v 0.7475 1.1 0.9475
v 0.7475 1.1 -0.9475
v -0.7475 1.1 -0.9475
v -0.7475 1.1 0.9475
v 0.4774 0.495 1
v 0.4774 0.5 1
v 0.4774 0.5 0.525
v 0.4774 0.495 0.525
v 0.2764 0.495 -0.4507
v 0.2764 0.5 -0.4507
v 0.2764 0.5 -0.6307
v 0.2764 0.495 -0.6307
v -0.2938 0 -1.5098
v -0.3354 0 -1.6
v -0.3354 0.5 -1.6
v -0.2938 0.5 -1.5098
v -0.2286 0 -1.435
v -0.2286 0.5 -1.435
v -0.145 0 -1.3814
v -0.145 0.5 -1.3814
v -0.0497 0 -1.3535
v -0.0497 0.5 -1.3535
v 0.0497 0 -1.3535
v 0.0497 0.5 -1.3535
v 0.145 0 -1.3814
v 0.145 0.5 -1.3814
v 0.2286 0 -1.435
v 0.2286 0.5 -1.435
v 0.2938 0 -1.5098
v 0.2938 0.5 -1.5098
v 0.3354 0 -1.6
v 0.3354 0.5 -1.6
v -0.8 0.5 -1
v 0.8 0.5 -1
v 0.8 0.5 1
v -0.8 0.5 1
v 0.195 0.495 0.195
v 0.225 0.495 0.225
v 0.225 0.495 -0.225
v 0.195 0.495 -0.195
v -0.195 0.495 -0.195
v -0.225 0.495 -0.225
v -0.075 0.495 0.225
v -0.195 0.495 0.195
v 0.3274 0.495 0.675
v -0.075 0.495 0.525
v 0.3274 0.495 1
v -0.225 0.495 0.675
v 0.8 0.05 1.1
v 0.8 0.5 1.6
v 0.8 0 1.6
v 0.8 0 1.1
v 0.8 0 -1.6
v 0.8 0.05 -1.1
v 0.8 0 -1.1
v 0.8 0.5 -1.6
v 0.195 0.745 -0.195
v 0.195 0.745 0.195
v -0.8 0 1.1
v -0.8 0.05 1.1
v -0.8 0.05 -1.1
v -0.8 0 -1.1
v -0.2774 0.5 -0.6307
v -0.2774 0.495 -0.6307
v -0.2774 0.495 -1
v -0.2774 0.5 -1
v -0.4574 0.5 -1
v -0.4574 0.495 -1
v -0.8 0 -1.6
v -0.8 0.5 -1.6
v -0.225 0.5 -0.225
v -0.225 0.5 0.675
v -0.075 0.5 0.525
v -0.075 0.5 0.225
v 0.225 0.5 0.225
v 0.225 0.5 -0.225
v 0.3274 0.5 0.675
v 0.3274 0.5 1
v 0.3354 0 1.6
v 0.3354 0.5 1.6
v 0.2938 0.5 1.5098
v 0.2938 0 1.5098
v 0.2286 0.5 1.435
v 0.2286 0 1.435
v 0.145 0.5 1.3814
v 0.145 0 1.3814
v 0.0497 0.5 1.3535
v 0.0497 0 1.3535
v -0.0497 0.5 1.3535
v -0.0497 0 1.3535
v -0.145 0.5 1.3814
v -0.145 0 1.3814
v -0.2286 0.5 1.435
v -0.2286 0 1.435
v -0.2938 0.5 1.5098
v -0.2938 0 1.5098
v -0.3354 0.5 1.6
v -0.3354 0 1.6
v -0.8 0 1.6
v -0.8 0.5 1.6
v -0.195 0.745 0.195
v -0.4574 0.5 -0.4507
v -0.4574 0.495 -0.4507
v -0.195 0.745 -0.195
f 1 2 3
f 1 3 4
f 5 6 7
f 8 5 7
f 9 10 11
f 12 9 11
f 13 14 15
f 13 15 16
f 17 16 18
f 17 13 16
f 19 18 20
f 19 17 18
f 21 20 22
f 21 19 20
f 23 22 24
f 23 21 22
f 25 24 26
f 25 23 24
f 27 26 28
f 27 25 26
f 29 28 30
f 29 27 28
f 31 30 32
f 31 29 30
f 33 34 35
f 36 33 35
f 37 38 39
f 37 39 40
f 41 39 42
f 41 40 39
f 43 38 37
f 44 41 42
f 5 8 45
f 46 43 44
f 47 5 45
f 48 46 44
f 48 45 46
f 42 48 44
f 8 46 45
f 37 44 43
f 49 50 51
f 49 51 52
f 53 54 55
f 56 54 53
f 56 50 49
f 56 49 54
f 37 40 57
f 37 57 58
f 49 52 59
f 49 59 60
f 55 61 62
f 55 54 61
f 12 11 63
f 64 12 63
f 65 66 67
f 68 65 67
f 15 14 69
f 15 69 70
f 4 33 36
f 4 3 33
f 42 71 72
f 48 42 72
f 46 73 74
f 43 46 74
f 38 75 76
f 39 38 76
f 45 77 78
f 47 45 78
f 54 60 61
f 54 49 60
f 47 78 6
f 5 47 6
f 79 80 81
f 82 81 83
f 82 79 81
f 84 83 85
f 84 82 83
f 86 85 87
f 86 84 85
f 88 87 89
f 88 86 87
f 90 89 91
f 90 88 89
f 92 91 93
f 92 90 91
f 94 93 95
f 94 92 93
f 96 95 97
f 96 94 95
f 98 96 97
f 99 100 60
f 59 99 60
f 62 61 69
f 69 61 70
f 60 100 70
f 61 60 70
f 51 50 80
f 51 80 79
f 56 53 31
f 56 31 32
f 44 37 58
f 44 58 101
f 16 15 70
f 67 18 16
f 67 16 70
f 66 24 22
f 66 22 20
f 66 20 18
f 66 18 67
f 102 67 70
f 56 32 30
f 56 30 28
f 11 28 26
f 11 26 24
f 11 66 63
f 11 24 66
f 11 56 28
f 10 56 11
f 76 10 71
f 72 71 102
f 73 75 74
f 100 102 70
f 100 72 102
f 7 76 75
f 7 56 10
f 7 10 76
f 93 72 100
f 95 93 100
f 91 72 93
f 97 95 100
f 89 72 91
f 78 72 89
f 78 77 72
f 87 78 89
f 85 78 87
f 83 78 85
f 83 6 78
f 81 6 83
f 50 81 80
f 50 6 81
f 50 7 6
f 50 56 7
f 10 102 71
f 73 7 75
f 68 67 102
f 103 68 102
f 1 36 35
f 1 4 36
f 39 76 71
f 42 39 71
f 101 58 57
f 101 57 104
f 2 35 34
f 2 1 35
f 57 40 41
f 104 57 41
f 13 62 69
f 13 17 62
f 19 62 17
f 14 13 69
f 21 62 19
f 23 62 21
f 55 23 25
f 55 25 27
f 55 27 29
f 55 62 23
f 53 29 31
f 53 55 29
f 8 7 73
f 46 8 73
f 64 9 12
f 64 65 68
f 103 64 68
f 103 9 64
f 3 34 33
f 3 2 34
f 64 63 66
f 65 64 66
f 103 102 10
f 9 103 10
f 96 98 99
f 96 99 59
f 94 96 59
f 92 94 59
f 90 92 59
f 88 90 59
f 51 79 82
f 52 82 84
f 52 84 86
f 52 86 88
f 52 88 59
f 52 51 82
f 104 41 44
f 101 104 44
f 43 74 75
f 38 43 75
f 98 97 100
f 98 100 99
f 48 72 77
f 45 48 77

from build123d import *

# Parameters (mm, degrees)
EXTRUDE1_DEPTH      = 0.8
EXTRUDE1_DEPTH_BACK = 0.8
SKETCH2_R           = 0.35
CUT_EXTRUDE1_DEPTH  = 2.857417562
CUT_EXTRUDE2_DEPTH  = 0.005
SKETCH4_W           = 0.39
SKETCH4_H           = 0.39
EXTRUDE2_DEPTH      = 0.25
SKETCH5_W           = 1.6
SKETCH5_H           = 2
EXTRUDE3_DEPTH      = 0.6
EXTRUDE3_TAPER      = 5


with BuildPart() as part:
    # Sketch1 → Extrude1 (new, two sides: drawn at the far end of the back side and taken through both)
    with BuildSketch(Plane(origin=(0, 0, 0), x_dir=(0, 0, -1), z_dir=(1, 0, 0)).offset(-EXTRUDE1_DEPTH_BACK)):
        Polygon((1.1, 0), (1.6, 0), (1.6, 0.5), (-1.6, 0.5), (-1.6, 0), (-1.1, 0), (-1.1, 0.05), (1.1, 0.05), align=None)
    extrude(amount=EXTRUDE1_DEPTH + EXTRUDE1_DEPTH_BACK)

    # Sketch2 → Cut-Extrude1 (cut, through all)
    with BuildSketch(Plane(origin=(0, 0, 0), x_dir=(1, 0, 0), z_dir=(0, 1, 0))):
        with Locations((0, 1.7)):
            Circle(SKETCH2_R)
        with Locations((0, -1.7)):
            Circle(SKETCH2_R)
    extrude(amount=CUT_EXTRUDE1_DEPTH, mode=Mode.SUBTRACT)

    # Sketch3 → Cut-Extrude2 (cut)
    with BuildSketch(Plane(origin=(0, 0.5, 0), x_dir=(-1, 0, 0), z_dir=(0, 1, 0))):
        Polygon((0.27741461, -1), (0.45741461, -1), (0.45741461, -0.450698672), (-0.276447509, -0.450698672), (-0.276447509, -0.630698672), (0.27741461, -0.630698672), align=None)
        Polygon((-0.225, -0.225), (0.225, -0.225), (0.225, 0.675), (-0.327379025, 0.675), (-0.327379025, 1), (-0.477379025, 1), (-0.477379025, 0.525), (0.075, 0.525), (0.075, 0.225), (-0.225, 0.225), align=None)
    extrude(amount=-CUT_EXTRUDE2_DEPTH, mode=Mode.SUBTRACT)

    # Sketch4 → Extrude2 (add)
    with BuildSketch(Plane(origin=(0, 0.495, 0), x_dir=(-1, 0, 0), z_dir=(0, 1, 0))):
        Rectangle(SKETCH4_W, SKETCH4_H)
    extrude(amount=EXTRUDE2_DEPTH)


with BuildPart() as body_2:
    # Sketch5 → Extrude3 (new body)
    with BuildSketch(Plane(origin=(0, 0.5, 0), x_dir=(-1, 0, 0), z_dir=(0, 1, 0))):
        Rectangle(SKETCH5_W, SKETCH5_H)
    extrude(amount=EXTRUDE3_DEPTH, taper=EXTRUDE3_TAPER)


solid = Compound([part.part, body_2.part])
